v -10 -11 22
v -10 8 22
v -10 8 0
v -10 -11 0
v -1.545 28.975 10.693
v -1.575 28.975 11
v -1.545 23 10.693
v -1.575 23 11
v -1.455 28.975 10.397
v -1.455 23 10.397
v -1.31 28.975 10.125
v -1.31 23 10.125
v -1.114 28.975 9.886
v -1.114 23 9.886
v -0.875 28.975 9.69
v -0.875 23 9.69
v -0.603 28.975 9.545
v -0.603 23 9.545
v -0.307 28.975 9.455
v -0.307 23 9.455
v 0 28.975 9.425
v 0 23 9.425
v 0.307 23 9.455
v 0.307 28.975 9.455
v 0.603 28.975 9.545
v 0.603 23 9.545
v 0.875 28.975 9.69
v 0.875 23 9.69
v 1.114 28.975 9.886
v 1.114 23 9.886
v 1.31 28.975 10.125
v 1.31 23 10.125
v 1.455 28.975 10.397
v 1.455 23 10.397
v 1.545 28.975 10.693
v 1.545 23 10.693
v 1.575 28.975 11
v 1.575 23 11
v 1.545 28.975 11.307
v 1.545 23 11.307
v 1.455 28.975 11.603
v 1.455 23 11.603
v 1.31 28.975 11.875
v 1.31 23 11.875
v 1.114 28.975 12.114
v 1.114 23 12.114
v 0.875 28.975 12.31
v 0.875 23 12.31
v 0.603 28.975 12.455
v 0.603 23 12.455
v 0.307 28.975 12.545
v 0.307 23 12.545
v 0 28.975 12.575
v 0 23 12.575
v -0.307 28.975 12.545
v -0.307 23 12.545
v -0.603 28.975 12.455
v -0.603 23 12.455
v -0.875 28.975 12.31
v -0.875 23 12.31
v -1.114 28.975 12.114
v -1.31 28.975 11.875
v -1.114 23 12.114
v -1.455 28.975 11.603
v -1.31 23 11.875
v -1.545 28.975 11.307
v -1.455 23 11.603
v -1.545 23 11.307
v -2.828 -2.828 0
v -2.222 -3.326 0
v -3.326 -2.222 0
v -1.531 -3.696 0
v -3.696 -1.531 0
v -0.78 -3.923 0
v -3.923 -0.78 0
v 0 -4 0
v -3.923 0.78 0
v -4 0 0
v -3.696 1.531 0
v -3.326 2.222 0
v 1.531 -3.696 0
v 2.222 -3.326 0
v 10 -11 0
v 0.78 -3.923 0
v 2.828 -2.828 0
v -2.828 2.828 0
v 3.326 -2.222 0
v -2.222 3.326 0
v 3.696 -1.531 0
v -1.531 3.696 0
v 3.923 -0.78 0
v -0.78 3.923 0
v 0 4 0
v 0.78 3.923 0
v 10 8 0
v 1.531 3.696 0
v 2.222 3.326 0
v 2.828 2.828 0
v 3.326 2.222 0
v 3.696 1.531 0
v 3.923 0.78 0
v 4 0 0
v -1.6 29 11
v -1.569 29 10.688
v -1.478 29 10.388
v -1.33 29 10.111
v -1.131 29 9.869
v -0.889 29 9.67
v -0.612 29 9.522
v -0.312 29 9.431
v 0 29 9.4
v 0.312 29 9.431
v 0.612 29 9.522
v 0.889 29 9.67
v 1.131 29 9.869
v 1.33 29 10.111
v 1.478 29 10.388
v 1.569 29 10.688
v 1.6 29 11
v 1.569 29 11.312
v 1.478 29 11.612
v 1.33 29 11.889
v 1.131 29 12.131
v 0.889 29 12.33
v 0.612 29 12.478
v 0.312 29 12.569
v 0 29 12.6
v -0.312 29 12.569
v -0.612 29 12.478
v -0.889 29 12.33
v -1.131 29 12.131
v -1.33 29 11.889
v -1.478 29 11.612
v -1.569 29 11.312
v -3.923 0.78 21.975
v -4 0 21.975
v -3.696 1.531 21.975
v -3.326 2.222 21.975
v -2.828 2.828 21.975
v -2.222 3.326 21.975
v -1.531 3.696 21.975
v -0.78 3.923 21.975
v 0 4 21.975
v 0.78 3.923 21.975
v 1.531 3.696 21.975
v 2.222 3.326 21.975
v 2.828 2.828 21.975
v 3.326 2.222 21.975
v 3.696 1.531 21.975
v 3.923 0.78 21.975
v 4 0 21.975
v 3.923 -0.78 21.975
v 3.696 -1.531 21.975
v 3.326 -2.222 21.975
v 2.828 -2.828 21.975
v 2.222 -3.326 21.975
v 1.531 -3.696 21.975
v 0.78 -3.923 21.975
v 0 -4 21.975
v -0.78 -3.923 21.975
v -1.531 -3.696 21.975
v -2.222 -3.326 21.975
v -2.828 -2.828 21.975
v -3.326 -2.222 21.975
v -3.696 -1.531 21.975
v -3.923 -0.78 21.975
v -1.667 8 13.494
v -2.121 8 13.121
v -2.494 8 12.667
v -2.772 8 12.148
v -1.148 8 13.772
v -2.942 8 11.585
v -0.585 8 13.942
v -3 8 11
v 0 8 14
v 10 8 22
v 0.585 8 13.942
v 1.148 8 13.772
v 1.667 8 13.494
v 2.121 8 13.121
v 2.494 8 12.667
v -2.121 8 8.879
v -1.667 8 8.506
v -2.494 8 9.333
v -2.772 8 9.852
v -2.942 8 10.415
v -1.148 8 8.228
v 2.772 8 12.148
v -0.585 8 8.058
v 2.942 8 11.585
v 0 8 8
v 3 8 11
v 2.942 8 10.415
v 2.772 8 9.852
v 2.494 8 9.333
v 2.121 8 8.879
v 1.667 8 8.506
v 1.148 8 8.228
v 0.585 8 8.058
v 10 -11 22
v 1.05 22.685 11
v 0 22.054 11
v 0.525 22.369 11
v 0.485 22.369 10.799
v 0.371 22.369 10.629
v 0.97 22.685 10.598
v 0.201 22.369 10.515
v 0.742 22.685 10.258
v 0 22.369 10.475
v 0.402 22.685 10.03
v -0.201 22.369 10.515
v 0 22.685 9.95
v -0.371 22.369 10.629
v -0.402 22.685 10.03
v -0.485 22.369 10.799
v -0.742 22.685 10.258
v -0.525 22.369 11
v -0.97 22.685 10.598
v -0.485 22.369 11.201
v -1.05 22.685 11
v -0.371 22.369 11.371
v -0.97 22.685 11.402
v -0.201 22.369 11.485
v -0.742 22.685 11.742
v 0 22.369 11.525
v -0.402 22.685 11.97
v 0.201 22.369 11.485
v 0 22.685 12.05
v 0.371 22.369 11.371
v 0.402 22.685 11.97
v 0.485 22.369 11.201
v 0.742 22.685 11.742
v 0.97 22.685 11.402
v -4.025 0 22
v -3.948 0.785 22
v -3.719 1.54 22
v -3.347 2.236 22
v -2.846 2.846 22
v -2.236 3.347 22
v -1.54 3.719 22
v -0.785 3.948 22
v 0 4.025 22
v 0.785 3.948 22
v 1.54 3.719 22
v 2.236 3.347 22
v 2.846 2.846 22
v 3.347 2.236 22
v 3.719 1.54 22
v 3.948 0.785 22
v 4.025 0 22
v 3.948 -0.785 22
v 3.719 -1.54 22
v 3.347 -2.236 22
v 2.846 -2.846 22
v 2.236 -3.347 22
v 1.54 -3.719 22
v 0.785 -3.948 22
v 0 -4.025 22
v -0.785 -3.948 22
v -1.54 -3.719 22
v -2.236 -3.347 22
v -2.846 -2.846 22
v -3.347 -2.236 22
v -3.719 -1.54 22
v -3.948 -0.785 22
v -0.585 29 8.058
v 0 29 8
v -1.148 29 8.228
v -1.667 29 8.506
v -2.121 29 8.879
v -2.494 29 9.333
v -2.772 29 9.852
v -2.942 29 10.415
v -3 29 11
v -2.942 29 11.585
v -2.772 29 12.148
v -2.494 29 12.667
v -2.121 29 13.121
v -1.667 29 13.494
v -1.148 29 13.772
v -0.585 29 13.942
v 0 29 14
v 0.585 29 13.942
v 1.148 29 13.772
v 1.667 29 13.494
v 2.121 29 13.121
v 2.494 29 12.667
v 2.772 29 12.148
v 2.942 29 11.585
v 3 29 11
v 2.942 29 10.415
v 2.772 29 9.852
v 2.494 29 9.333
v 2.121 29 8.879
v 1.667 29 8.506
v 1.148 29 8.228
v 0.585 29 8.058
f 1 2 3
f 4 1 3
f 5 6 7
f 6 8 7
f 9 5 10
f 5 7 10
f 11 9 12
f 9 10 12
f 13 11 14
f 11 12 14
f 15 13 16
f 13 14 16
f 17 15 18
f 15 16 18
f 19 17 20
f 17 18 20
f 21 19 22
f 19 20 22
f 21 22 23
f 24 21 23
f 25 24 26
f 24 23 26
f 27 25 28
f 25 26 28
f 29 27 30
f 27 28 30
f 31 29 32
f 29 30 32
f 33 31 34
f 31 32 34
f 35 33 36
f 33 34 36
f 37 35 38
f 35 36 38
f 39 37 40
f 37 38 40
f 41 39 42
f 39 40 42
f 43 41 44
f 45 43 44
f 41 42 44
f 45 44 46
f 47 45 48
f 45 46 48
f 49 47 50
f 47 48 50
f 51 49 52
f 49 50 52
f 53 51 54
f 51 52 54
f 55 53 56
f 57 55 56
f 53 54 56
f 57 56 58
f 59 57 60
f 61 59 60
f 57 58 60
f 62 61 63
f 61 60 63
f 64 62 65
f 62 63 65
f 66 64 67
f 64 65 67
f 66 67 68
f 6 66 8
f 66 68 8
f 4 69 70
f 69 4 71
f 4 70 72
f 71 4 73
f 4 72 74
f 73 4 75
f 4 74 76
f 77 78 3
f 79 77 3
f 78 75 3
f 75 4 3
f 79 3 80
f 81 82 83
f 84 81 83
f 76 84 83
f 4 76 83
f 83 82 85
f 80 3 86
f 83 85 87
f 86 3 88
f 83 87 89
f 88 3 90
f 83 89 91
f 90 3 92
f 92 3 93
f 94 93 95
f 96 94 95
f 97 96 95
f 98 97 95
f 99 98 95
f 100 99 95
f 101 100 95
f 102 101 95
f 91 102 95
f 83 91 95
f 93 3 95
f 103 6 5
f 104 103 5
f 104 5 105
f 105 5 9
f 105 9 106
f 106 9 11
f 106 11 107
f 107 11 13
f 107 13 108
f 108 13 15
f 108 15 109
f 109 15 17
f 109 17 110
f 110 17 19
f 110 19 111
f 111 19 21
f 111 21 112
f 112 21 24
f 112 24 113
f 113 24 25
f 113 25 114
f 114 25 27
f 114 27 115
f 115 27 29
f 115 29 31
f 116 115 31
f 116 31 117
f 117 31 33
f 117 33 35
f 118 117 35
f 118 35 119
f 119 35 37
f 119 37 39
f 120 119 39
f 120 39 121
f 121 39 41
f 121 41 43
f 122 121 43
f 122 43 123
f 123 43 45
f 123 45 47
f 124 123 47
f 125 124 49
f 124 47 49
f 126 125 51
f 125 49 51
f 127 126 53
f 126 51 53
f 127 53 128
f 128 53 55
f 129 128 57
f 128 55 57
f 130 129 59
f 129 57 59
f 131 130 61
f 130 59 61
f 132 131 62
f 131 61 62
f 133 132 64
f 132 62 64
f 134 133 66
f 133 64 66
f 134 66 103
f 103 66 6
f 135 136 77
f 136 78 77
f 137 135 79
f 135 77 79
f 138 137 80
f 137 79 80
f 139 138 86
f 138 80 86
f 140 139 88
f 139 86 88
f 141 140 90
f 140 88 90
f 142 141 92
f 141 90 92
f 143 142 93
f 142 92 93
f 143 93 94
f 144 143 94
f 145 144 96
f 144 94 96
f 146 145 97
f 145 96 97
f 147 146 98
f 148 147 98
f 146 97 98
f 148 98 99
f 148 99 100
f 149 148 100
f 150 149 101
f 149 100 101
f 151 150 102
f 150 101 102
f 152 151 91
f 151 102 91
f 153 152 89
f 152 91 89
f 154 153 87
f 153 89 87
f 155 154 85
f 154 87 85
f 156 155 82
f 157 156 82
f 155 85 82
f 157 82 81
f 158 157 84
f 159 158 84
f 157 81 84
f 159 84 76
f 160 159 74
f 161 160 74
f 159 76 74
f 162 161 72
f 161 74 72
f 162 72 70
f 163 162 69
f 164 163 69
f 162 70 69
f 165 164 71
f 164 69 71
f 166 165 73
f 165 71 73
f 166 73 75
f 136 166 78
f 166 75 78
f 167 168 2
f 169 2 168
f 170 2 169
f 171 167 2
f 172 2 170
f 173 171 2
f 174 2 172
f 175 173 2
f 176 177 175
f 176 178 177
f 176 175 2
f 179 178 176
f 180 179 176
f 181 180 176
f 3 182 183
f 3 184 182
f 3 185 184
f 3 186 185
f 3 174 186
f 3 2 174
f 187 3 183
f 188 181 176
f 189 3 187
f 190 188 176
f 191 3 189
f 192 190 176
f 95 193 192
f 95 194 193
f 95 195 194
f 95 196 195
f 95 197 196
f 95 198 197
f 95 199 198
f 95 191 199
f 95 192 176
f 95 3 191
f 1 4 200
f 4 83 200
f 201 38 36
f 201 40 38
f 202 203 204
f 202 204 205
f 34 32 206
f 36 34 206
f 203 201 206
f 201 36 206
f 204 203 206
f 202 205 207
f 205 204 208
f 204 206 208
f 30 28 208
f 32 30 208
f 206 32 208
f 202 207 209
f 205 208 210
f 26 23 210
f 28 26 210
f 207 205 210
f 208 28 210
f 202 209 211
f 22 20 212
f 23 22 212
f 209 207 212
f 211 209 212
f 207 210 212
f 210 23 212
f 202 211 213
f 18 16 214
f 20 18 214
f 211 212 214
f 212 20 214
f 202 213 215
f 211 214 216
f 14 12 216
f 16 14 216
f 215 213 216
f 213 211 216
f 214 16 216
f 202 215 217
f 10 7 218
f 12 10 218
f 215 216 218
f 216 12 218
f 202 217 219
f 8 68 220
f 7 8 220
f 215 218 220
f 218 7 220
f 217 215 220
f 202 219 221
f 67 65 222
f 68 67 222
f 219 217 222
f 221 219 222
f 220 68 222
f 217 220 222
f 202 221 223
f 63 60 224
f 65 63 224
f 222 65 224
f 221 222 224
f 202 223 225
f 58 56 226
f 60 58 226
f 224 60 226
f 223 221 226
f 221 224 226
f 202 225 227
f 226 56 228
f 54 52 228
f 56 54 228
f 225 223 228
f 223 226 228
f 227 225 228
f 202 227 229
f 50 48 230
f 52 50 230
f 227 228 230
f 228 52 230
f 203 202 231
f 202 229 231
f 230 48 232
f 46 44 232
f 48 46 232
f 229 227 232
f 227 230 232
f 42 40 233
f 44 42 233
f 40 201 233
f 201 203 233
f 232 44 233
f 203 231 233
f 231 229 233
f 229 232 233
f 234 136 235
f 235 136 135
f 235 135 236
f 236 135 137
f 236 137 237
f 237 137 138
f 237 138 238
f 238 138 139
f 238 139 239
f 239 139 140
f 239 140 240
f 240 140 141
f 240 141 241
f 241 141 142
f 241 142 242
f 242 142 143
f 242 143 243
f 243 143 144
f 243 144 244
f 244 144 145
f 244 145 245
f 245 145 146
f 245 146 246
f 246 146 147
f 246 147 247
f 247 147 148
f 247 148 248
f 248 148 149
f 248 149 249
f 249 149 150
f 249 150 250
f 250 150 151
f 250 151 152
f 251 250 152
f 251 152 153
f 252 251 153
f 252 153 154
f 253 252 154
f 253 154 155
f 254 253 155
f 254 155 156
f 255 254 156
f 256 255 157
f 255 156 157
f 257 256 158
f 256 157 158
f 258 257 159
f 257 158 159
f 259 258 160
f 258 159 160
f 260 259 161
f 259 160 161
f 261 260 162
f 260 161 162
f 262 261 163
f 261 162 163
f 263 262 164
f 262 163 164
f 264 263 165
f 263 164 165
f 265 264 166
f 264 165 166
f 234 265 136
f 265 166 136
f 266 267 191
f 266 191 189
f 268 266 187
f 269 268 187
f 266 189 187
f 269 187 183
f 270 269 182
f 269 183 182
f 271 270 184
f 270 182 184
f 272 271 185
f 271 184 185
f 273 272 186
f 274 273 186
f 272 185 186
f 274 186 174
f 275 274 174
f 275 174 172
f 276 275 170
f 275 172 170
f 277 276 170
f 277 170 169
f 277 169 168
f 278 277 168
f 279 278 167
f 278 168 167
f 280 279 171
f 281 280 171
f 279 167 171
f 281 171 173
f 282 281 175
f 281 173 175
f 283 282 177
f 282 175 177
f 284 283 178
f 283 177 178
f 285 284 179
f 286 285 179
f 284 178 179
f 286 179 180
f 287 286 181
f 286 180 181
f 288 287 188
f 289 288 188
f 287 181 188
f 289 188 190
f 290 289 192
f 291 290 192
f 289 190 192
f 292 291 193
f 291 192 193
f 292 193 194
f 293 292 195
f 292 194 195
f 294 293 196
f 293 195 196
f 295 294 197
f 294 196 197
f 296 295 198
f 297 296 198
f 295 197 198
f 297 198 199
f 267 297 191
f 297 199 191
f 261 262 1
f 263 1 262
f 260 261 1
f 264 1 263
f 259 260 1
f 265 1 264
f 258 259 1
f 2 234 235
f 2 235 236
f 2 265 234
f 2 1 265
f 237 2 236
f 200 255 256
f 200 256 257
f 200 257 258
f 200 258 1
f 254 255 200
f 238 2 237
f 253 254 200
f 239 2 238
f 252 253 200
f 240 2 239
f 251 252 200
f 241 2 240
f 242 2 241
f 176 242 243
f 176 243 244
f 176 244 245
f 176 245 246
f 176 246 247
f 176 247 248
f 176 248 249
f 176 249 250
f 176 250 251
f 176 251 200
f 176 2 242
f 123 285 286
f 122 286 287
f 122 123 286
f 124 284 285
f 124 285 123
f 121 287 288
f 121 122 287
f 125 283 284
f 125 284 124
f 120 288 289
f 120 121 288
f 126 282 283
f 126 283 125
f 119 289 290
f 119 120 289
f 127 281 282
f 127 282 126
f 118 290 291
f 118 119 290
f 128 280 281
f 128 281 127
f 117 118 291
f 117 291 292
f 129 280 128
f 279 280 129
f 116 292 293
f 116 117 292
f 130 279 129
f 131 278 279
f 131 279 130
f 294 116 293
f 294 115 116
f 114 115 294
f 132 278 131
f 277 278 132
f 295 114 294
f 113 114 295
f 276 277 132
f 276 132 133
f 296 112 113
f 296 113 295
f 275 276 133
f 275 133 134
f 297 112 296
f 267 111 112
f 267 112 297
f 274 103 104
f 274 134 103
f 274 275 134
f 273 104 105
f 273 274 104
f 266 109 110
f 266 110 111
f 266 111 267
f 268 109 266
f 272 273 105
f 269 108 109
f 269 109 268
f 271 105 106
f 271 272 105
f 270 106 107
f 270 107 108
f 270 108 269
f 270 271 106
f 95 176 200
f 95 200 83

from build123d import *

# Parameters (mm, degrees)
SKETCH1_R                              = 10
BOSS_EXTRUDE1_DEPTH                    = 22
SKETCH6_R                              = 11
BOSS_EXTRUDE2_DEPTH                    = 11
F_8_0MM_DOWEL_HOLE1_D                  = 8
F_8_0MM_DOWEL_HOLE1_CSINK_D            = 8.05
F_8_0MM_DOWEL_HOLE1_CSINK_ANGLE        = 90
SKETCH9_R                              = 15.792919945
CUT_EXTRUDE1_DEPTH                     = 3
SKETCH8_R                              = 3
BOSS_EXTRUDE3_DEPTH                    = 21
SKETCH10_W                             = 4
SKETCH10_H                             = 22
BOSS_EXTRUDE4_DEPTH                    = 19
BOSS_EXTRUDE5_START                    = -3
BOSS_EXTRUDE5_DEPTH                    = 3
SKETCH12_W                             = 26
SKETCH12_H                             = 28
SKETCH12_W_2                           = 20
SKETCH12_H_2                           = 22
CUT_EXTRUDE2_DEPTH                     = 47.957427527
TAP_DRILL_FOR_M3_HELICOIL1_D           = 3.15
TAP_DRILL_FOR_M3_HELICOIL1_DEPTH       = 6
TAP_DRILL_FOR_M3_HELICOIL1_CSINK_D     = 3.2
TAP_DRILL_FOR_M3_HELICOIL1_CSINK_ANGLE = 90
TAP_DRILL_FOR_M3_HELICOIL1_TIP         = 0.946355475


with BuildPart() as part:
    # Sketch1 → Boss-Extrude1 (new body)
    with BuildSketch(Plane.XY):
        Circle(SKETCH1_R)
    extrude(amount=BOSS_EXTRUDE1_DEPTH)

    # Sketch6 → Boss-Extrude2 (add, symmetric)
    with BuildSketch(Plane(origin=(0, 0, 0), x_dir=(1, 0, 0), z_dir=(0, 1, 0))):
        with Locations(Location((0, -11, 0), (0, 0, 270))):
            Circle(SKETCH6_R)
    extrude(amount=BOSS_EXTRUDE2_DEPTH, both=True)

    # Ø8.0mm Dowel Hole1 (through all)
    with Locations(Plane.XY.offset(22)):
        with Locations((0, 0)):
            CounterSinkHole(F_8_0MM_DOWEL_HOLE1_D / 2, F_8_0MM_DOWEL_HOLE1_CSINK_D / 2, counter_sink_angle=F_8_0MM_DOWEL_HOLE1_CSINK_ANGLE)

    # Sketch9 → Cut-Extrude1 (cut)
    with BuildSketch(Plane(origin=(0, 11, 0), x_dir=(1, 0, 0), z_dir=(0, 1, 0))):
        with Locations((0, -11)):
            Circle(SKETCH9_R)
    extrude(amount=-CUT_EXTRUDE1_DEPTH, mode=Mode.SUBTRACT)

    # Sketch8 → Boss-Extrude3 (add)
    with BuildSketch(Plane(origin=(0, 8, 0), x_dir=(1, 0, 0), z_dir=(0, 1, 0))):
        with Locations(Location((0, -11, 0), (0, 0, 90))):
            Circle(SKETCH8_R)
    extrude(amount=BOSS_EXTRUDE3_DEPTH)

    # Sketch10 → Boss-Extrude4 (add)
    with BuildSketch(Plane(origin=(0, 8, 0), x_dir=(1, 0, 0), z_dir=(0, 1, 0))):
        with Locations((-8, -11)):
            Rectangle(SKETCH10_W, SKETCH10_H)
        with Locations((8, -11)):
            Rectangle(SKETCH10_W, SKETCH10_H)
    extrude(amount=-BOSS_EXTRUDE4_DEPTH)

    # Sketch11 → Boss-Extrude5 (add)
    with BuildSketch(Plane.XZ.offset(11).offset(BOSS_EXTRUDE5_START)):
        with BuildLine():
            Line((0, 22), (-6, 22))
            Line((-6, 22), (-6, 20.219544457))
            ThreePointArc((-6, 20.219544457), (-3.129297922, 21.545496409), (0, 22))
        make_face()
        with BuildLine():
            Line((6, 22), (0, 22))
            ThreePointArc((0, 22), (3.129297922, 21.545496409), (6, 20.219544457))
            Line((6, 20.219544457), (6, 22))
        make_face()
        with BuildLine():
            Line((-6, 1.780455543), (-6, 0))
            Line((-6, 0), (-1.12e-07, 0))
            ThreePointArc((-1.12e-07, 0), (-3.129297976, 0.454503607), (-6, 1.780455543))
        make_face()
        with BuildLine():
            ThreePointArc((6, 1.780455543), (3.129297868, 0.454503575), (-1.12e-07, 0))
            Line((-1.12e-07, 0), (6, 0))
            Line((6, 0), (6, 1.780455543))
        make_face()
    extrude(amount=BOSS_EXTRUDE5_DEPTH)

    # Sketch12 → Cut-Extrude2 (cut, through all)
    with BuildSketch(Plane.XZ.offset(11)):
        with Locations((0, 11)):
            Rectangle(SKETCH12_W, SKETCH12_H)
        with Locations((0, 11)):
            Rectangle(SKETCH12_W_2, SKETCH12_H_2, mode=Mode.SUBTRACT)
    extrude(amount=-CUT_EXTRUDE2_DEPTH, mode=Mode.SUBTRACT)

    # Tap Drill for M3 Helicoil1
    with Locations(Plane(origin=(0, 29, 0), x_dir=(1, 0, 0), z_dir=(0, 1, 0))):
        with Locations((0, -11)):
            CounterSinkHole(TAP_DRILL_FOR_M3_HELICOIL1_D / 2, TAP_DRILL_FOR_M3_HELICOIL1_CSINK_D / 2, depth=TAP_DRILL_FOR_M3_HELICOIL1_DEPTH, counter_sink_angle=TAP_DRILL_FOR_M3_HELICOIL1_CSINK_ANGLE)
            with Locations((0, 0, -(TAP_DRILL_FOR_M3_HELICOIL1_DEPTH + TAP_DRILL_FOR_M3_HELICOIL1_TIP / 2))):  # 118° drill point
                Cone(0, TAP_DRILL_FOR_M3_HELICOIL1_D / 2, TAP_DRILL_FOR_M3_HELICOIL1_TIP, mode=Mode.SUBTRACT)


solid = part.part
